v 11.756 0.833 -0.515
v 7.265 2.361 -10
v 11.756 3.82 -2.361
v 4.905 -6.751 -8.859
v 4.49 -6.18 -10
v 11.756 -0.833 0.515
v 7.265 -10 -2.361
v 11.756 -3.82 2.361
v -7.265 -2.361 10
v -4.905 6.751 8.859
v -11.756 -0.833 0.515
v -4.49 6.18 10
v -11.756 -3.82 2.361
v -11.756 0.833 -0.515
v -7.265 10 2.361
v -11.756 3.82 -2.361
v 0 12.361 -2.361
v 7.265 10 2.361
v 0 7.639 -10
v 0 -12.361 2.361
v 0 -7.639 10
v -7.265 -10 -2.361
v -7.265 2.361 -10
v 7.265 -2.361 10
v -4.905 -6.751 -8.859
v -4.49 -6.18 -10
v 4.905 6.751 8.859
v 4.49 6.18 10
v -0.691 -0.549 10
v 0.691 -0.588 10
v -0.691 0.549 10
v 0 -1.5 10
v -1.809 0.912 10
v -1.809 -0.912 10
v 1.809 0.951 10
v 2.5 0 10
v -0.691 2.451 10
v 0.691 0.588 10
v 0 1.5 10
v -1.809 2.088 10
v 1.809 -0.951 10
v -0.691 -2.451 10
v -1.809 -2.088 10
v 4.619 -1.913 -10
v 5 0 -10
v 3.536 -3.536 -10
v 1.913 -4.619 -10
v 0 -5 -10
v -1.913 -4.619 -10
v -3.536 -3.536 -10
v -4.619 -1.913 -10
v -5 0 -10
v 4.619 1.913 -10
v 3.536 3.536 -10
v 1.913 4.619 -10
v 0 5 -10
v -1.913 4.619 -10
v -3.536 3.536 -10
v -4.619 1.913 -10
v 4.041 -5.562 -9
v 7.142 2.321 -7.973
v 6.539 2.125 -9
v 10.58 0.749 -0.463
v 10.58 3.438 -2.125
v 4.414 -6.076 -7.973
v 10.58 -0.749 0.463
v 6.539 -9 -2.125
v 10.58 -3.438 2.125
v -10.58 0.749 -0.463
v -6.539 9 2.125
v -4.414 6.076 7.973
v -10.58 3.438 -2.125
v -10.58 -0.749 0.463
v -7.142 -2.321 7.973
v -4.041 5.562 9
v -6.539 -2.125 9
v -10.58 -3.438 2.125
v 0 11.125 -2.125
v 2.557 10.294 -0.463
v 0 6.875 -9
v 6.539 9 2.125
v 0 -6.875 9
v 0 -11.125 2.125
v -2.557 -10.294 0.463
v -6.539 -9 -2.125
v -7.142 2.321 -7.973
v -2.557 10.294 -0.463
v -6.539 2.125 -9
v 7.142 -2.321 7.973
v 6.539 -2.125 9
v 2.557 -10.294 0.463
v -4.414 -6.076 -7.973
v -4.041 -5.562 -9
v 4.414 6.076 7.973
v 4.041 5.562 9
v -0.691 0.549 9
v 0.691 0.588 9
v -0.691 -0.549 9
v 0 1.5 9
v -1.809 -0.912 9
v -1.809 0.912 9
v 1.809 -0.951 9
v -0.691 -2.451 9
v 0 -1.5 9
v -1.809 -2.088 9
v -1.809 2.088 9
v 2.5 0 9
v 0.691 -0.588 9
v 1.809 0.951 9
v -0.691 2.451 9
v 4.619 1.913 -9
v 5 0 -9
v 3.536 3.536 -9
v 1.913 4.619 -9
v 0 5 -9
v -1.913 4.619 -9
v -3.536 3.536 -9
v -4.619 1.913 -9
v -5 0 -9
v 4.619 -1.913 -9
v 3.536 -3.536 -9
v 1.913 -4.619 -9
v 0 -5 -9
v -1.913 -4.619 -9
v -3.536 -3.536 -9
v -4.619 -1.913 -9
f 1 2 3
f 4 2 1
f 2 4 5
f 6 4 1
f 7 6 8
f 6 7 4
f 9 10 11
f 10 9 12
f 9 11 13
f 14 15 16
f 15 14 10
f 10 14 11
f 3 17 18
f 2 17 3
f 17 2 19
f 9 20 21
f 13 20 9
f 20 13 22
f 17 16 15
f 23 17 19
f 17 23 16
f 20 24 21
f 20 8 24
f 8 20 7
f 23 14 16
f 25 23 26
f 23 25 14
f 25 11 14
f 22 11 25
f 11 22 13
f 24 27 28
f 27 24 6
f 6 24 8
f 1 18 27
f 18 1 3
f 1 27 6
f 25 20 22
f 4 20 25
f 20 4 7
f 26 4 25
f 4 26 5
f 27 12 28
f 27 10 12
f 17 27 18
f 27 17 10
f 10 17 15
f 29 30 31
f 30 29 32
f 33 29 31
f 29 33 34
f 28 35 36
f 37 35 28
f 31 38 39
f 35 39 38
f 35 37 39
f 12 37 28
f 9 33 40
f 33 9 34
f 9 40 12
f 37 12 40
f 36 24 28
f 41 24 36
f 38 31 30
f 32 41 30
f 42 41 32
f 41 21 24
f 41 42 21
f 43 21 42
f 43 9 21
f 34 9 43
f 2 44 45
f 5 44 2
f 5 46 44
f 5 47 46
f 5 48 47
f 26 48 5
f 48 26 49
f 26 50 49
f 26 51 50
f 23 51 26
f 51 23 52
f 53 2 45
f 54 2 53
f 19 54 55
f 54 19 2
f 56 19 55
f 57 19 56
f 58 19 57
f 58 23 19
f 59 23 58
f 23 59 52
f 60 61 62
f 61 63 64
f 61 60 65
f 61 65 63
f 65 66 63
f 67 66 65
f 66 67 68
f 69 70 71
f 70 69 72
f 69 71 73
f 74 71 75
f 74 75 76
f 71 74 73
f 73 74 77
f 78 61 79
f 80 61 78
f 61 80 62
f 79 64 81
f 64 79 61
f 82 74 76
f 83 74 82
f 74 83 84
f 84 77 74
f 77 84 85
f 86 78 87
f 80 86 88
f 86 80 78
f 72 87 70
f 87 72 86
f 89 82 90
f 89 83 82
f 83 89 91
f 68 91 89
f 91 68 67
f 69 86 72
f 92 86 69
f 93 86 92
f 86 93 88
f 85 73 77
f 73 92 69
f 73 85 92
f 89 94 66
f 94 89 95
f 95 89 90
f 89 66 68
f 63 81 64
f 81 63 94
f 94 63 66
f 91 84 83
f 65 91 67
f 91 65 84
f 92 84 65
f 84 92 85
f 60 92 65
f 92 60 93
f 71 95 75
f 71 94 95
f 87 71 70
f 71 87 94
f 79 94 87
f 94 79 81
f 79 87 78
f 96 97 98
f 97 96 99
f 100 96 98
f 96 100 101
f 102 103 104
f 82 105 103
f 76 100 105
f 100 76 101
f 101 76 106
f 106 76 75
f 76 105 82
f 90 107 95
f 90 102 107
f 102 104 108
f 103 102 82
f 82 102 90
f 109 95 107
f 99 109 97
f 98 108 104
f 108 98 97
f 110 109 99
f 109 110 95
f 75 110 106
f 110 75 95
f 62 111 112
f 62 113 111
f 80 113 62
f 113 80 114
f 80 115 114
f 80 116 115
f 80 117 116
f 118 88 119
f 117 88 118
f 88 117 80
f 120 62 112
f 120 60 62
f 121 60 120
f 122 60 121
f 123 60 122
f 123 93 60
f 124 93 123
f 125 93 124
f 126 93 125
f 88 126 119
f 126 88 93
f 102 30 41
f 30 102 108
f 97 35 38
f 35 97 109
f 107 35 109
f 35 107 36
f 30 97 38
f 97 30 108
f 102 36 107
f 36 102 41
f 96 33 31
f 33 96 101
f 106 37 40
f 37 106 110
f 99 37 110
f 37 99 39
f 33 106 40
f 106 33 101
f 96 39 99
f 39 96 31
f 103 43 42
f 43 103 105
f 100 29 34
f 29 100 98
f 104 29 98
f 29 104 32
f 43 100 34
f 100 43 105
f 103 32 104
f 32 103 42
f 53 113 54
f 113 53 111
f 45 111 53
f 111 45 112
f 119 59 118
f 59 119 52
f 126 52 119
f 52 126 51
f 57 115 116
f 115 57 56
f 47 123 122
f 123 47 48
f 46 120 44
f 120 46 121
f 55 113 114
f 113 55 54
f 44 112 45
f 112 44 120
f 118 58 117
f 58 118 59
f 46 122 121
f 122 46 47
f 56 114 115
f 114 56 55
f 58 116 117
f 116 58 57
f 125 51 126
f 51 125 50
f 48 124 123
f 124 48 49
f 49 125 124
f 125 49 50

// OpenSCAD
//saltshaker 

//modules
module box(size) {
    cube([2*size, 2*size, size], center = true); 
}

module dodecahedron(size) {
      dihedral = 116.565;
      intersection(){
            box(size);
            intersection_for(i=[1:5])  { 
                rotate([dihedral, 0, 360 / 5 * i])  box(size); 
           }
      }
}

//difference

 difference()
{
        dodecahedron(20);
    dodecahedron(18);
    *cube(12);
   translate([1.5,0,0])
    cylinder(12);
    translate([-1,1.5,0])
    cylinder(12);
     translate([-1,-1.5,0])
    cylinder(12);
      translate([0,0,-15])
    cylinder(h = 9, r=5, center = false);
    
}

//base
{
    translate([0,0,-9.5])
    circle(r=5, d=9.5);
     translate([0,0,-10])
    circle(r=5, d=12);
       
}


    
